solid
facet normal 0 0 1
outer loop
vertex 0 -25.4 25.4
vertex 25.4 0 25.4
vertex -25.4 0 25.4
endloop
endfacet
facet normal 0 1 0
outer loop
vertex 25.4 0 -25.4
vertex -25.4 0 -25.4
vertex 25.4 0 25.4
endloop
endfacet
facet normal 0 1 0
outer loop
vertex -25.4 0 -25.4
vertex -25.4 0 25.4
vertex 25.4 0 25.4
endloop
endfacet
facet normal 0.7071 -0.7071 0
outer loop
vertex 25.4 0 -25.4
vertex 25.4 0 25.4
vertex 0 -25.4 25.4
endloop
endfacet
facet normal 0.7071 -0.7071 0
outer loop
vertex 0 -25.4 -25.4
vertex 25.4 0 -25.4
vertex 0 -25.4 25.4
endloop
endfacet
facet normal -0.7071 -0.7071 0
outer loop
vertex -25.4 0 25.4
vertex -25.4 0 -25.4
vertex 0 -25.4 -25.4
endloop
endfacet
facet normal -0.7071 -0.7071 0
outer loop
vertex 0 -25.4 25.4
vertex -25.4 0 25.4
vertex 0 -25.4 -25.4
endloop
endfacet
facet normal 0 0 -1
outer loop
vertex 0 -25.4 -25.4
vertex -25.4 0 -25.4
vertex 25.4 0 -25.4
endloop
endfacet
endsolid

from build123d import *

# Parameters (mm, degrees)
F1_DEPTH = 25.4
F2_DEPTH = 25.4
F3_DEPTH = 25.4
F4_DEPTH = 25.4
F6_DEPTH = 50.8
F8_DEPTH = 50.8


with BuildPart() as f1:
    # F0 (on Front) → F1 (new body)
    with BuildSketch(Plane.XZ):
        Polygon((-25.4, 25.4), (-25.4, -25.4), (0, 0), align=None)
    extrude(amount=F1_DEPTH)

    # F0 (on Front) → F2 (join)
    with BuildSketch(Plane.XZ):
        Polygon((0, 0), (25.4, 25.4), (-25.4, 25.4), align=None)
    extrude(amount=F2_DEPTH)

    # F0 (on Front) → F3 (join)
    with BuildSketch(Plane.XZ):
        Polygon((0, 0), (25.4, -25.4), (25.4, 25.4), align=None)
    extrude(amount=F3_DEPTH)

    # F0 (on Front) → F4 (join)
    with BuildSketch(Plane.XZ):
        Polygon((-25.4, -25.4), (25.4, -25.4), (0, 0), align=None)
    extrude(amount=F4_DEPTH)

    # F5 (on face) → F6 (cut)
    with BuildSketch(Plane(origin=(0, 0, -25.4), x_dir=(1, 0, 0), z_dir=(0, 0, -1))):
        Polygon((-25.4, 0), (0, 25.4), (-25.4, 25.4), align=None)
    extrude(amount=-F6_DEPTH, mode=Mode.SUBTRACT)

    # F7 (on face) → F8 (cut)
    with BuildSketch(Plane.XY.offset(25.4)):
        Polygon((25.4, 0), (0, -25.4), (25.4, -25.4), align=None)
    extrude(amount=-F8_DEPTH, mode=Mode.SUBTRACT)


solid = f1.part
